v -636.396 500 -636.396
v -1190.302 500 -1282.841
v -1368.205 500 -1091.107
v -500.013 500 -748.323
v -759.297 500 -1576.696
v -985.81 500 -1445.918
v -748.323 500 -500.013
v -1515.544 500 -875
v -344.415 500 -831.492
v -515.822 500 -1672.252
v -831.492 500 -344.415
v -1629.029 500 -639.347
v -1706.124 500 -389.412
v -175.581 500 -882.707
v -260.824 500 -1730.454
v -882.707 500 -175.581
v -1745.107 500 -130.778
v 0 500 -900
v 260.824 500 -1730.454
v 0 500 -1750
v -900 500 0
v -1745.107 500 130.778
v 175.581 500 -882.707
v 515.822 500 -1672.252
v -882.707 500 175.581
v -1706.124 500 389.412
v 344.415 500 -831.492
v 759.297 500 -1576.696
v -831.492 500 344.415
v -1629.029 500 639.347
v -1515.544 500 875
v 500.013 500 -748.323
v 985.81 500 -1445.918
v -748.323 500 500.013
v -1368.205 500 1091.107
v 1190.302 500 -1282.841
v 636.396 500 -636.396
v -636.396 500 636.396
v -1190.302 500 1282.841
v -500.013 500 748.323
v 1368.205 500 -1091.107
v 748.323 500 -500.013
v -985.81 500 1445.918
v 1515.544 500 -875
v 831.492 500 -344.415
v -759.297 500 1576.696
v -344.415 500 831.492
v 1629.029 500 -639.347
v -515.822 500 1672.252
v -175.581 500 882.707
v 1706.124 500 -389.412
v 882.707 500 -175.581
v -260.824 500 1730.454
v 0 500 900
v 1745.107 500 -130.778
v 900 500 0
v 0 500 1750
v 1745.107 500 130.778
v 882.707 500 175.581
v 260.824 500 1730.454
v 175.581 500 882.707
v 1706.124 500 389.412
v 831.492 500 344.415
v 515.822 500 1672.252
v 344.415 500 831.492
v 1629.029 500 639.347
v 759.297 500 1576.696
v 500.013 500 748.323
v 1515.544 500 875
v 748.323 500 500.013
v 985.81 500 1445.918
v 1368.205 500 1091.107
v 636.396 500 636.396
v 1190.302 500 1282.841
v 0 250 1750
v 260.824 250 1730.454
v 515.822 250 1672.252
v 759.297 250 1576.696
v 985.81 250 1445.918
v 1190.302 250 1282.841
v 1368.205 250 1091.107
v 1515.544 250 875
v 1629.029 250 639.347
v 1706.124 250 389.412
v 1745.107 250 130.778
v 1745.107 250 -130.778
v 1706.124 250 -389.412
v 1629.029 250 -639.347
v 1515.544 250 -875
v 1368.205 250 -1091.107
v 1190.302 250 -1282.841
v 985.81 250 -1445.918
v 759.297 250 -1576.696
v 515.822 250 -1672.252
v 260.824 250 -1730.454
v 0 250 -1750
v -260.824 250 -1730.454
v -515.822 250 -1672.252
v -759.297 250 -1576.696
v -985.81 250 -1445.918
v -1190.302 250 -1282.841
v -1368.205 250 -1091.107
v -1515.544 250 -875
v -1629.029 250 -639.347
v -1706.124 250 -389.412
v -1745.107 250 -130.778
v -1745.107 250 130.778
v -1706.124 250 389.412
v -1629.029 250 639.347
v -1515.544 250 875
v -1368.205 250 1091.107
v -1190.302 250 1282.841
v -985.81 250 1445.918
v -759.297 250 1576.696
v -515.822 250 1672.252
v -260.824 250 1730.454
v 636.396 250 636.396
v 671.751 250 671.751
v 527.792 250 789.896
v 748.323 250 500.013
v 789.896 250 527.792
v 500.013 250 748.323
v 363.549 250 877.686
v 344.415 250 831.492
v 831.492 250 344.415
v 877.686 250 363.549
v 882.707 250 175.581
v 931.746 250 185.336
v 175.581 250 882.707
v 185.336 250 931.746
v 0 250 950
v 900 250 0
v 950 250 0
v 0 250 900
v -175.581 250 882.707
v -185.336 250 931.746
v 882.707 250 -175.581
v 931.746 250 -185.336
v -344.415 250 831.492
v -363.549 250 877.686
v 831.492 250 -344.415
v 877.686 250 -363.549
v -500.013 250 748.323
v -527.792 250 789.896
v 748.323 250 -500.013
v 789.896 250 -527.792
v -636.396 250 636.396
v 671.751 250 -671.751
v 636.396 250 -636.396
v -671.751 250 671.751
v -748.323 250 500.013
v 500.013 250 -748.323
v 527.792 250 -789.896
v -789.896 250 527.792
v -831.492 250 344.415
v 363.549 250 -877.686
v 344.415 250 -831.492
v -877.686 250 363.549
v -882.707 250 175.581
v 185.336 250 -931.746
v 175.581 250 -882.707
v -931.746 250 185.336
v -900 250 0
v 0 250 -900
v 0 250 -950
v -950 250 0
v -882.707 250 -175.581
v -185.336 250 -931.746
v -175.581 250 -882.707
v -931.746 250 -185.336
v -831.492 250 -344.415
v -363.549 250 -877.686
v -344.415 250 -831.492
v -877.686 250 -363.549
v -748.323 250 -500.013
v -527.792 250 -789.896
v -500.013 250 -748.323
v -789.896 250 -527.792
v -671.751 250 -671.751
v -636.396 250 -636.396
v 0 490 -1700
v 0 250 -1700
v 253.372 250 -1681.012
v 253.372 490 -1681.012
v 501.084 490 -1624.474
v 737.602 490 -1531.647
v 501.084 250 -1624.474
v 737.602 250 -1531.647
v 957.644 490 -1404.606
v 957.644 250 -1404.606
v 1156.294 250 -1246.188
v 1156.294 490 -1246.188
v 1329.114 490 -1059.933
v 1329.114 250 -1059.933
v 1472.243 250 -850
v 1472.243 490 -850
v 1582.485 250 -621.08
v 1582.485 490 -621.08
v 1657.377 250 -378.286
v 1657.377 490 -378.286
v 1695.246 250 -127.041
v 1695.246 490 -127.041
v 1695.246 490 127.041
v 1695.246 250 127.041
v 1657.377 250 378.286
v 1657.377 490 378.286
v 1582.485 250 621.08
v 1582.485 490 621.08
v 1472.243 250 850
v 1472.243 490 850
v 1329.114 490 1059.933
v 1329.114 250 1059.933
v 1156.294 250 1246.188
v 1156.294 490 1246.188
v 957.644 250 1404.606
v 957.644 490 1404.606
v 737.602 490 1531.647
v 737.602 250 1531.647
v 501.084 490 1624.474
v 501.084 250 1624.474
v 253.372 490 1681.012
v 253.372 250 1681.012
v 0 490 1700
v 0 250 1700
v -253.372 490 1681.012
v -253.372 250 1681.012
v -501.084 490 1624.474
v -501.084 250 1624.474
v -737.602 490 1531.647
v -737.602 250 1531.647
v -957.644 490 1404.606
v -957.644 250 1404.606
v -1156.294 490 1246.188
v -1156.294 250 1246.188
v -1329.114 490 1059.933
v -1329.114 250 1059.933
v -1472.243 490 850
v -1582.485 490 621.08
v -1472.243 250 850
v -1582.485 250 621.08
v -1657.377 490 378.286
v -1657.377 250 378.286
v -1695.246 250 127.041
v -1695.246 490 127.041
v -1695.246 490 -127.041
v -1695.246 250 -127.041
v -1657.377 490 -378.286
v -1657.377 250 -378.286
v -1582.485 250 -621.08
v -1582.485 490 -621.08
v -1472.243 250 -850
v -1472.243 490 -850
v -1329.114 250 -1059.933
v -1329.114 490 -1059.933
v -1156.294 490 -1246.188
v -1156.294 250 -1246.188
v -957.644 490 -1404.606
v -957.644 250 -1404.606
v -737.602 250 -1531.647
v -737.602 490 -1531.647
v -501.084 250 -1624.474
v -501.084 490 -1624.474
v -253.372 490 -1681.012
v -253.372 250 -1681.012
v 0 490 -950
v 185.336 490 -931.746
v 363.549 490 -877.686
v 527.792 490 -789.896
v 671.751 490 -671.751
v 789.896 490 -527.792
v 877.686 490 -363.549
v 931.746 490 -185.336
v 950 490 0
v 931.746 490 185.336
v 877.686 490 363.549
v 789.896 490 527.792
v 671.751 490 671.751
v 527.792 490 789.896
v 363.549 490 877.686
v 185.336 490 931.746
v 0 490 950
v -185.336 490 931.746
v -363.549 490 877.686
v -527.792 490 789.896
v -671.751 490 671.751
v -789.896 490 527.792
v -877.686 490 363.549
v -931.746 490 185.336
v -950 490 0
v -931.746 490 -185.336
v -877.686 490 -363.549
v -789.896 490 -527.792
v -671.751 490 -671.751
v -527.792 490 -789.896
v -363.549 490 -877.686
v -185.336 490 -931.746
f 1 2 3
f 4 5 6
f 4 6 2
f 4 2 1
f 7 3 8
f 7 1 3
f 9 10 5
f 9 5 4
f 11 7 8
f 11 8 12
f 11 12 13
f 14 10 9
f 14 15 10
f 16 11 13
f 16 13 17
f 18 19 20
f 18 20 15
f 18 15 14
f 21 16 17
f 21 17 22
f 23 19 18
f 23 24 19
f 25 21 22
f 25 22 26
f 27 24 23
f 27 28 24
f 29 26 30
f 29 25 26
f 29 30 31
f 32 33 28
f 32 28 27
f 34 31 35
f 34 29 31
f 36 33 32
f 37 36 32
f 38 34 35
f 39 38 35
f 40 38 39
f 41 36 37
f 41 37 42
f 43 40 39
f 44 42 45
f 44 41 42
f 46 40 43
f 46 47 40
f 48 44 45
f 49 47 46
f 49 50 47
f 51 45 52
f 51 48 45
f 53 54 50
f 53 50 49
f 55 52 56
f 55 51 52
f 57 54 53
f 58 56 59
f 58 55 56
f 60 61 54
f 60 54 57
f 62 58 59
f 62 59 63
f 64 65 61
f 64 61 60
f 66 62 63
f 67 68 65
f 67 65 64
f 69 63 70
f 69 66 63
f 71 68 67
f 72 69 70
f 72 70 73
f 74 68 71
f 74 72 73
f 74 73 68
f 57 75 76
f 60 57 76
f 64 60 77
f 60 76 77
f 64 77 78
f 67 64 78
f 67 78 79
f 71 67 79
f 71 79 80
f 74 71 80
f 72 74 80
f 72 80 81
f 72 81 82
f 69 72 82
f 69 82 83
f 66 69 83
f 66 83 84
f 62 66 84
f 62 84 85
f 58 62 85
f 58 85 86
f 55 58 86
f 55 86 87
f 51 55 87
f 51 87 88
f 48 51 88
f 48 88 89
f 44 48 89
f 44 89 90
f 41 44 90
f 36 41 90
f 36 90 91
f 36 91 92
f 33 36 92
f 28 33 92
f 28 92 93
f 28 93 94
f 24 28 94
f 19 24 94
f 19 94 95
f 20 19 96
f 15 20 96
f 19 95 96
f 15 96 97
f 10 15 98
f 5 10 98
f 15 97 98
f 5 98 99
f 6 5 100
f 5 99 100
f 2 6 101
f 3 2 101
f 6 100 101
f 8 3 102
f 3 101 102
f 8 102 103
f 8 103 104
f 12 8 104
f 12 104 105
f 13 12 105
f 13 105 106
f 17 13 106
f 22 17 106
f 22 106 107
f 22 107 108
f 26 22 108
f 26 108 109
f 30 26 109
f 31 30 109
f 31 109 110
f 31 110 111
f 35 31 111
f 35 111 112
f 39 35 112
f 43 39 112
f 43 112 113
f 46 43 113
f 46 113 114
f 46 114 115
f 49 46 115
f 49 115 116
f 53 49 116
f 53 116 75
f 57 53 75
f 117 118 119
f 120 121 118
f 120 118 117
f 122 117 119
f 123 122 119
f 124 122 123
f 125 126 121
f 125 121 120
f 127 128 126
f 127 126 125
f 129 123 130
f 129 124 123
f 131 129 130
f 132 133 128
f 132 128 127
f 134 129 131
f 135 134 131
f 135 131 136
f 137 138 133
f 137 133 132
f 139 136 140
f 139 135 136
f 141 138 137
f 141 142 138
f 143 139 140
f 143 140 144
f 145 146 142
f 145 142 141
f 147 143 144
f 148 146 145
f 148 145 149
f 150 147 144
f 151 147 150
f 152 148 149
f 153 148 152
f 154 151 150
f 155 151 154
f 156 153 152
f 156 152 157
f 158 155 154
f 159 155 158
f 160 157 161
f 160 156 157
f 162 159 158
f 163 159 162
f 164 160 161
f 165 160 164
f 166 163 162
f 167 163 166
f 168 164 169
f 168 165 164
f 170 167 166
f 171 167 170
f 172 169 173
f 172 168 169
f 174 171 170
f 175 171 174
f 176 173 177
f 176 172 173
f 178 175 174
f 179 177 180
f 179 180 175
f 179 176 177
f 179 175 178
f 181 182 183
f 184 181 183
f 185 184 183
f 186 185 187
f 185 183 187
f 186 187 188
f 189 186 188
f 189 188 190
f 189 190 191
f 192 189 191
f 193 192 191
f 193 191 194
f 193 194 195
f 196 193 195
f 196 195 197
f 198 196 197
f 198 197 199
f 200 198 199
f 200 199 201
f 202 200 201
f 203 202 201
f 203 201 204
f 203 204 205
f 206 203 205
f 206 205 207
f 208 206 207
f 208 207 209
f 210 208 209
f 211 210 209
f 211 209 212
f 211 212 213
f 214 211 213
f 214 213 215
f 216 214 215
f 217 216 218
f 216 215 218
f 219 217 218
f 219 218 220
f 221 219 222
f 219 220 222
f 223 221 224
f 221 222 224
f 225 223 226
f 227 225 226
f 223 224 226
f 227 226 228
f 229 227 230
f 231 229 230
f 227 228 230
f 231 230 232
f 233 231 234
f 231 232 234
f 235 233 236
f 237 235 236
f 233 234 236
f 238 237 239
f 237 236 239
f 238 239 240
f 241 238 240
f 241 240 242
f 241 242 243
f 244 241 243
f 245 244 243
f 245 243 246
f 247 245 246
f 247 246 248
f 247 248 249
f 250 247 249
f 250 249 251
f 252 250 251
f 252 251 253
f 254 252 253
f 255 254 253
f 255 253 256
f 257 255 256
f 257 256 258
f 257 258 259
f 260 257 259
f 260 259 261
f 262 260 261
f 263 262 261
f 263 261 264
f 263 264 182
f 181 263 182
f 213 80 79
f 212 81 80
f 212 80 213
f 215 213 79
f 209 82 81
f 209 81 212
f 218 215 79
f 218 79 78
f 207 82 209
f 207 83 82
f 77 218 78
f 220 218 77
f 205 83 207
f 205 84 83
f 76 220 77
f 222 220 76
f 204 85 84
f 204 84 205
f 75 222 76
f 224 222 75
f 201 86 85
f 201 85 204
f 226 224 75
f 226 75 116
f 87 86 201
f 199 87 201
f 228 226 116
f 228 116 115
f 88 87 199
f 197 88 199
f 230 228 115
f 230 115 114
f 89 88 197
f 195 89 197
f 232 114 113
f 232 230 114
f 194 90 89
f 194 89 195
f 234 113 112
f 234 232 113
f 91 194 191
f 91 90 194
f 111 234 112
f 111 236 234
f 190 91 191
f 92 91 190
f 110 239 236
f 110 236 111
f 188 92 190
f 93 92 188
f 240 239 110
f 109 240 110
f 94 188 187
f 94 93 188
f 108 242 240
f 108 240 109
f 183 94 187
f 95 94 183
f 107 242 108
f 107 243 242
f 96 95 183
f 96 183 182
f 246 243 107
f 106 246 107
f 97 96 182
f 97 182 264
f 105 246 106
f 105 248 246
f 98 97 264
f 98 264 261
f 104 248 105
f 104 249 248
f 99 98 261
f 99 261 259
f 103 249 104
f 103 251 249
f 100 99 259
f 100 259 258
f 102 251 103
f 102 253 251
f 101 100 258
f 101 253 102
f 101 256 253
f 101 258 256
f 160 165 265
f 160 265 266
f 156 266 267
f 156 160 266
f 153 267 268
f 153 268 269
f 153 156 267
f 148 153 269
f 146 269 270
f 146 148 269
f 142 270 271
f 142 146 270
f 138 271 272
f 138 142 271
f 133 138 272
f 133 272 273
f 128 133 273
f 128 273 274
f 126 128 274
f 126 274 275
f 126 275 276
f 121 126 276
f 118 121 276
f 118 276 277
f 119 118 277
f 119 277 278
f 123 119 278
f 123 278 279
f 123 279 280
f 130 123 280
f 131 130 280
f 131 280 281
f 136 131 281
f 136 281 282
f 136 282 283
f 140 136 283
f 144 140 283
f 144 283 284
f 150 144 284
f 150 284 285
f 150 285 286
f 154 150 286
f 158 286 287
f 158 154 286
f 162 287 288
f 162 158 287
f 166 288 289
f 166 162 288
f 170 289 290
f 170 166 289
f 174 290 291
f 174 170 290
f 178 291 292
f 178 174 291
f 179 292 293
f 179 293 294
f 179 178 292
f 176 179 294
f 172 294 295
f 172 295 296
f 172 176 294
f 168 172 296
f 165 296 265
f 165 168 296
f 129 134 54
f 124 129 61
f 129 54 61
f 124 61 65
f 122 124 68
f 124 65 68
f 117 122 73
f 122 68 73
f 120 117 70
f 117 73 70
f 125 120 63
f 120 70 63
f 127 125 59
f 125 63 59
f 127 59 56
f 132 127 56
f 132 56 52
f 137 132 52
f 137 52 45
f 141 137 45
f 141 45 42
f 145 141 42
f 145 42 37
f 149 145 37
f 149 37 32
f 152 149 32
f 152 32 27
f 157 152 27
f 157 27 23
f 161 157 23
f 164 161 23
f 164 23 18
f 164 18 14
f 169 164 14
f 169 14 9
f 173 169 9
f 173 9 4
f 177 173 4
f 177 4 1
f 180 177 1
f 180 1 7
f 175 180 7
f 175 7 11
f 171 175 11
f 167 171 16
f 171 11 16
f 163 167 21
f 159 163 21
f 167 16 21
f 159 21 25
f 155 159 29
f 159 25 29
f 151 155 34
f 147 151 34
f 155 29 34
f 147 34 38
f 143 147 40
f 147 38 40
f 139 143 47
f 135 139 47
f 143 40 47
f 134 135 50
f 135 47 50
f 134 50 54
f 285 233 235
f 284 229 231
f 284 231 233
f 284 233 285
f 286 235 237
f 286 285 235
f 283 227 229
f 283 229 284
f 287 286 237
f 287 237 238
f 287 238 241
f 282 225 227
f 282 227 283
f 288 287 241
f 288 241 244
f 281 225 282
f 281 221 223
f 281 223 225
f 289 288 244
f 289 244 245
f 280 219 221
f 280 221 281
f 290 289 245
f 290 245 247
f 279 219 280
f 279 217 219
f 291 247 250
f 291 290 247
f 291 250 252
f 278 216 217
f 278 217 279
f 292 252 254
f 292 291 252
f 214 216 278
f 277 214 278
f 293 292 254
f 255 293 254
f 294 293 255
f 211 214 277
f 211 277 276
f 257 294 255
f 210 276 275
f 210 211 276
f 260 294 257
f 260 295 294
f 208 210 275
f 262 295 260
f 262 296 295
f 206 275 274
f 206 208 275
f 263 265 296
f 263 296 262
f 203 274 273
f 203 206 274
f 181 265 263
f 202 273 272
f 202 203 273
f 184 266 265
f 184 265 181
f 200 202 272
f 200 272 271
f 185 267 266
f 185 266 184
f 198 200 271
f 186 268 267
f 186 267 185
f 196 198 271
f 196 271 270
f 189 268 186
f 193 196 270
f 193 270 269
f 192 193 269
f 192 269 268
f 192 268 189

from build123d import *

# Parameters (mm, degrees)
SKETCH1_R               = 1750
BOSS_EXTRUDE1_DEPTH     = 500
SKETCH2_R               = 900
CUT_EXTRUDE2_DEPTH      = 300
SKETCH3_R               = 600
CUT_EXTRUDE3_DEPTH      = 300
SKETCH4_R               = 1700
SKETCH4_R_2             = 950
CUT_EXTRUDE5_DEPTH      = 490
CUT_EXTRUDE6_DEPTH      = 2525.876234591
CUT_EXTRUDE6_DEPTH_BACK = 2525.876234591
SKETCH5_W               = 1750
SKETCH5_H               = 250


with BuildPart() as part:
    # Sketch1 → Boss-Extrude1 (new body)
    with BuildSketch(Plane(origin=(0, 0, 0), x_dir=(1, 0, 0), z_dir=(0, 1, 0))):
        with Locations(Location((0, 0, 0), (0, 0, 270))):
            Circle(SKETCH1_R)
    extrude(amount=BOSS_EXTRUDE1_DEPTH)

    # Sketch2 → Cut-Extrude2 (cut)
    with BuildSketch(Plane(origin=(0, 500, 0), x_dir=(1, 0, 0), z_dir=(0, 1, 0))):
        with Locations(Location((0, 0, 0), (0, 0, 270))):
            Circle(SKETCH2_R)
    extrude(amount=-CUT_EXTRUDE2_DEPTH, mode=Mode.SUBTRACT)

    # Sketch3 → Cut-Extrude3 (cut)
    with BuildSketch(Plane.XZ):
        with Locations(Location((0, 0, 0), (0, 0, 270))):
            Circle(SKETCH3_R)
    extrude(amount=-CUT_EXTRUDE3_DEPTH, mode=Mode.SUBTRACT)

    # Sketch4 → Cut-Extrude5 (cut)
    with BuildSketch(Plane(origin=(0, 0, 0), x_dir=(-1, 0, 0), z_dir=(0, -1, 0))):
        with Locations(Location((0, 0, 0), (0, 0, 90))):
            Circle(SKETCH4_R)
        with Locations(Location((0, 0, 0), (0, 0, 90))):
            Circle(SKETCH4_R_2, mode=Mode.SUBTRACT)
    extrude(amount=-CUT_EXTRUDE5_DEPTH, mode=Mode.SUBTRACT)

    # Sketch5 → Cut-Extrude6 (cut, two sides: drawn at the far end of the back side and taken through both)
    with BuildSketch(Plane.XY.offset(-CUT_EXTRUDE6_DEPTH_BACK)):
        with Locations((-875, 125)):
            Rectangle(SKETCH5_W, SKETCH5_H)
        with Locations((875, 125)):
            Rectangle(SKETCH5_W, SKETCH5_H)
    extrude(amount=CUT_EXTRUDE6_DEPTH + CUT_EXTRUDE6_DEPTH_BACK, mode=Mode.SUBTRACT)


solid = part.part
